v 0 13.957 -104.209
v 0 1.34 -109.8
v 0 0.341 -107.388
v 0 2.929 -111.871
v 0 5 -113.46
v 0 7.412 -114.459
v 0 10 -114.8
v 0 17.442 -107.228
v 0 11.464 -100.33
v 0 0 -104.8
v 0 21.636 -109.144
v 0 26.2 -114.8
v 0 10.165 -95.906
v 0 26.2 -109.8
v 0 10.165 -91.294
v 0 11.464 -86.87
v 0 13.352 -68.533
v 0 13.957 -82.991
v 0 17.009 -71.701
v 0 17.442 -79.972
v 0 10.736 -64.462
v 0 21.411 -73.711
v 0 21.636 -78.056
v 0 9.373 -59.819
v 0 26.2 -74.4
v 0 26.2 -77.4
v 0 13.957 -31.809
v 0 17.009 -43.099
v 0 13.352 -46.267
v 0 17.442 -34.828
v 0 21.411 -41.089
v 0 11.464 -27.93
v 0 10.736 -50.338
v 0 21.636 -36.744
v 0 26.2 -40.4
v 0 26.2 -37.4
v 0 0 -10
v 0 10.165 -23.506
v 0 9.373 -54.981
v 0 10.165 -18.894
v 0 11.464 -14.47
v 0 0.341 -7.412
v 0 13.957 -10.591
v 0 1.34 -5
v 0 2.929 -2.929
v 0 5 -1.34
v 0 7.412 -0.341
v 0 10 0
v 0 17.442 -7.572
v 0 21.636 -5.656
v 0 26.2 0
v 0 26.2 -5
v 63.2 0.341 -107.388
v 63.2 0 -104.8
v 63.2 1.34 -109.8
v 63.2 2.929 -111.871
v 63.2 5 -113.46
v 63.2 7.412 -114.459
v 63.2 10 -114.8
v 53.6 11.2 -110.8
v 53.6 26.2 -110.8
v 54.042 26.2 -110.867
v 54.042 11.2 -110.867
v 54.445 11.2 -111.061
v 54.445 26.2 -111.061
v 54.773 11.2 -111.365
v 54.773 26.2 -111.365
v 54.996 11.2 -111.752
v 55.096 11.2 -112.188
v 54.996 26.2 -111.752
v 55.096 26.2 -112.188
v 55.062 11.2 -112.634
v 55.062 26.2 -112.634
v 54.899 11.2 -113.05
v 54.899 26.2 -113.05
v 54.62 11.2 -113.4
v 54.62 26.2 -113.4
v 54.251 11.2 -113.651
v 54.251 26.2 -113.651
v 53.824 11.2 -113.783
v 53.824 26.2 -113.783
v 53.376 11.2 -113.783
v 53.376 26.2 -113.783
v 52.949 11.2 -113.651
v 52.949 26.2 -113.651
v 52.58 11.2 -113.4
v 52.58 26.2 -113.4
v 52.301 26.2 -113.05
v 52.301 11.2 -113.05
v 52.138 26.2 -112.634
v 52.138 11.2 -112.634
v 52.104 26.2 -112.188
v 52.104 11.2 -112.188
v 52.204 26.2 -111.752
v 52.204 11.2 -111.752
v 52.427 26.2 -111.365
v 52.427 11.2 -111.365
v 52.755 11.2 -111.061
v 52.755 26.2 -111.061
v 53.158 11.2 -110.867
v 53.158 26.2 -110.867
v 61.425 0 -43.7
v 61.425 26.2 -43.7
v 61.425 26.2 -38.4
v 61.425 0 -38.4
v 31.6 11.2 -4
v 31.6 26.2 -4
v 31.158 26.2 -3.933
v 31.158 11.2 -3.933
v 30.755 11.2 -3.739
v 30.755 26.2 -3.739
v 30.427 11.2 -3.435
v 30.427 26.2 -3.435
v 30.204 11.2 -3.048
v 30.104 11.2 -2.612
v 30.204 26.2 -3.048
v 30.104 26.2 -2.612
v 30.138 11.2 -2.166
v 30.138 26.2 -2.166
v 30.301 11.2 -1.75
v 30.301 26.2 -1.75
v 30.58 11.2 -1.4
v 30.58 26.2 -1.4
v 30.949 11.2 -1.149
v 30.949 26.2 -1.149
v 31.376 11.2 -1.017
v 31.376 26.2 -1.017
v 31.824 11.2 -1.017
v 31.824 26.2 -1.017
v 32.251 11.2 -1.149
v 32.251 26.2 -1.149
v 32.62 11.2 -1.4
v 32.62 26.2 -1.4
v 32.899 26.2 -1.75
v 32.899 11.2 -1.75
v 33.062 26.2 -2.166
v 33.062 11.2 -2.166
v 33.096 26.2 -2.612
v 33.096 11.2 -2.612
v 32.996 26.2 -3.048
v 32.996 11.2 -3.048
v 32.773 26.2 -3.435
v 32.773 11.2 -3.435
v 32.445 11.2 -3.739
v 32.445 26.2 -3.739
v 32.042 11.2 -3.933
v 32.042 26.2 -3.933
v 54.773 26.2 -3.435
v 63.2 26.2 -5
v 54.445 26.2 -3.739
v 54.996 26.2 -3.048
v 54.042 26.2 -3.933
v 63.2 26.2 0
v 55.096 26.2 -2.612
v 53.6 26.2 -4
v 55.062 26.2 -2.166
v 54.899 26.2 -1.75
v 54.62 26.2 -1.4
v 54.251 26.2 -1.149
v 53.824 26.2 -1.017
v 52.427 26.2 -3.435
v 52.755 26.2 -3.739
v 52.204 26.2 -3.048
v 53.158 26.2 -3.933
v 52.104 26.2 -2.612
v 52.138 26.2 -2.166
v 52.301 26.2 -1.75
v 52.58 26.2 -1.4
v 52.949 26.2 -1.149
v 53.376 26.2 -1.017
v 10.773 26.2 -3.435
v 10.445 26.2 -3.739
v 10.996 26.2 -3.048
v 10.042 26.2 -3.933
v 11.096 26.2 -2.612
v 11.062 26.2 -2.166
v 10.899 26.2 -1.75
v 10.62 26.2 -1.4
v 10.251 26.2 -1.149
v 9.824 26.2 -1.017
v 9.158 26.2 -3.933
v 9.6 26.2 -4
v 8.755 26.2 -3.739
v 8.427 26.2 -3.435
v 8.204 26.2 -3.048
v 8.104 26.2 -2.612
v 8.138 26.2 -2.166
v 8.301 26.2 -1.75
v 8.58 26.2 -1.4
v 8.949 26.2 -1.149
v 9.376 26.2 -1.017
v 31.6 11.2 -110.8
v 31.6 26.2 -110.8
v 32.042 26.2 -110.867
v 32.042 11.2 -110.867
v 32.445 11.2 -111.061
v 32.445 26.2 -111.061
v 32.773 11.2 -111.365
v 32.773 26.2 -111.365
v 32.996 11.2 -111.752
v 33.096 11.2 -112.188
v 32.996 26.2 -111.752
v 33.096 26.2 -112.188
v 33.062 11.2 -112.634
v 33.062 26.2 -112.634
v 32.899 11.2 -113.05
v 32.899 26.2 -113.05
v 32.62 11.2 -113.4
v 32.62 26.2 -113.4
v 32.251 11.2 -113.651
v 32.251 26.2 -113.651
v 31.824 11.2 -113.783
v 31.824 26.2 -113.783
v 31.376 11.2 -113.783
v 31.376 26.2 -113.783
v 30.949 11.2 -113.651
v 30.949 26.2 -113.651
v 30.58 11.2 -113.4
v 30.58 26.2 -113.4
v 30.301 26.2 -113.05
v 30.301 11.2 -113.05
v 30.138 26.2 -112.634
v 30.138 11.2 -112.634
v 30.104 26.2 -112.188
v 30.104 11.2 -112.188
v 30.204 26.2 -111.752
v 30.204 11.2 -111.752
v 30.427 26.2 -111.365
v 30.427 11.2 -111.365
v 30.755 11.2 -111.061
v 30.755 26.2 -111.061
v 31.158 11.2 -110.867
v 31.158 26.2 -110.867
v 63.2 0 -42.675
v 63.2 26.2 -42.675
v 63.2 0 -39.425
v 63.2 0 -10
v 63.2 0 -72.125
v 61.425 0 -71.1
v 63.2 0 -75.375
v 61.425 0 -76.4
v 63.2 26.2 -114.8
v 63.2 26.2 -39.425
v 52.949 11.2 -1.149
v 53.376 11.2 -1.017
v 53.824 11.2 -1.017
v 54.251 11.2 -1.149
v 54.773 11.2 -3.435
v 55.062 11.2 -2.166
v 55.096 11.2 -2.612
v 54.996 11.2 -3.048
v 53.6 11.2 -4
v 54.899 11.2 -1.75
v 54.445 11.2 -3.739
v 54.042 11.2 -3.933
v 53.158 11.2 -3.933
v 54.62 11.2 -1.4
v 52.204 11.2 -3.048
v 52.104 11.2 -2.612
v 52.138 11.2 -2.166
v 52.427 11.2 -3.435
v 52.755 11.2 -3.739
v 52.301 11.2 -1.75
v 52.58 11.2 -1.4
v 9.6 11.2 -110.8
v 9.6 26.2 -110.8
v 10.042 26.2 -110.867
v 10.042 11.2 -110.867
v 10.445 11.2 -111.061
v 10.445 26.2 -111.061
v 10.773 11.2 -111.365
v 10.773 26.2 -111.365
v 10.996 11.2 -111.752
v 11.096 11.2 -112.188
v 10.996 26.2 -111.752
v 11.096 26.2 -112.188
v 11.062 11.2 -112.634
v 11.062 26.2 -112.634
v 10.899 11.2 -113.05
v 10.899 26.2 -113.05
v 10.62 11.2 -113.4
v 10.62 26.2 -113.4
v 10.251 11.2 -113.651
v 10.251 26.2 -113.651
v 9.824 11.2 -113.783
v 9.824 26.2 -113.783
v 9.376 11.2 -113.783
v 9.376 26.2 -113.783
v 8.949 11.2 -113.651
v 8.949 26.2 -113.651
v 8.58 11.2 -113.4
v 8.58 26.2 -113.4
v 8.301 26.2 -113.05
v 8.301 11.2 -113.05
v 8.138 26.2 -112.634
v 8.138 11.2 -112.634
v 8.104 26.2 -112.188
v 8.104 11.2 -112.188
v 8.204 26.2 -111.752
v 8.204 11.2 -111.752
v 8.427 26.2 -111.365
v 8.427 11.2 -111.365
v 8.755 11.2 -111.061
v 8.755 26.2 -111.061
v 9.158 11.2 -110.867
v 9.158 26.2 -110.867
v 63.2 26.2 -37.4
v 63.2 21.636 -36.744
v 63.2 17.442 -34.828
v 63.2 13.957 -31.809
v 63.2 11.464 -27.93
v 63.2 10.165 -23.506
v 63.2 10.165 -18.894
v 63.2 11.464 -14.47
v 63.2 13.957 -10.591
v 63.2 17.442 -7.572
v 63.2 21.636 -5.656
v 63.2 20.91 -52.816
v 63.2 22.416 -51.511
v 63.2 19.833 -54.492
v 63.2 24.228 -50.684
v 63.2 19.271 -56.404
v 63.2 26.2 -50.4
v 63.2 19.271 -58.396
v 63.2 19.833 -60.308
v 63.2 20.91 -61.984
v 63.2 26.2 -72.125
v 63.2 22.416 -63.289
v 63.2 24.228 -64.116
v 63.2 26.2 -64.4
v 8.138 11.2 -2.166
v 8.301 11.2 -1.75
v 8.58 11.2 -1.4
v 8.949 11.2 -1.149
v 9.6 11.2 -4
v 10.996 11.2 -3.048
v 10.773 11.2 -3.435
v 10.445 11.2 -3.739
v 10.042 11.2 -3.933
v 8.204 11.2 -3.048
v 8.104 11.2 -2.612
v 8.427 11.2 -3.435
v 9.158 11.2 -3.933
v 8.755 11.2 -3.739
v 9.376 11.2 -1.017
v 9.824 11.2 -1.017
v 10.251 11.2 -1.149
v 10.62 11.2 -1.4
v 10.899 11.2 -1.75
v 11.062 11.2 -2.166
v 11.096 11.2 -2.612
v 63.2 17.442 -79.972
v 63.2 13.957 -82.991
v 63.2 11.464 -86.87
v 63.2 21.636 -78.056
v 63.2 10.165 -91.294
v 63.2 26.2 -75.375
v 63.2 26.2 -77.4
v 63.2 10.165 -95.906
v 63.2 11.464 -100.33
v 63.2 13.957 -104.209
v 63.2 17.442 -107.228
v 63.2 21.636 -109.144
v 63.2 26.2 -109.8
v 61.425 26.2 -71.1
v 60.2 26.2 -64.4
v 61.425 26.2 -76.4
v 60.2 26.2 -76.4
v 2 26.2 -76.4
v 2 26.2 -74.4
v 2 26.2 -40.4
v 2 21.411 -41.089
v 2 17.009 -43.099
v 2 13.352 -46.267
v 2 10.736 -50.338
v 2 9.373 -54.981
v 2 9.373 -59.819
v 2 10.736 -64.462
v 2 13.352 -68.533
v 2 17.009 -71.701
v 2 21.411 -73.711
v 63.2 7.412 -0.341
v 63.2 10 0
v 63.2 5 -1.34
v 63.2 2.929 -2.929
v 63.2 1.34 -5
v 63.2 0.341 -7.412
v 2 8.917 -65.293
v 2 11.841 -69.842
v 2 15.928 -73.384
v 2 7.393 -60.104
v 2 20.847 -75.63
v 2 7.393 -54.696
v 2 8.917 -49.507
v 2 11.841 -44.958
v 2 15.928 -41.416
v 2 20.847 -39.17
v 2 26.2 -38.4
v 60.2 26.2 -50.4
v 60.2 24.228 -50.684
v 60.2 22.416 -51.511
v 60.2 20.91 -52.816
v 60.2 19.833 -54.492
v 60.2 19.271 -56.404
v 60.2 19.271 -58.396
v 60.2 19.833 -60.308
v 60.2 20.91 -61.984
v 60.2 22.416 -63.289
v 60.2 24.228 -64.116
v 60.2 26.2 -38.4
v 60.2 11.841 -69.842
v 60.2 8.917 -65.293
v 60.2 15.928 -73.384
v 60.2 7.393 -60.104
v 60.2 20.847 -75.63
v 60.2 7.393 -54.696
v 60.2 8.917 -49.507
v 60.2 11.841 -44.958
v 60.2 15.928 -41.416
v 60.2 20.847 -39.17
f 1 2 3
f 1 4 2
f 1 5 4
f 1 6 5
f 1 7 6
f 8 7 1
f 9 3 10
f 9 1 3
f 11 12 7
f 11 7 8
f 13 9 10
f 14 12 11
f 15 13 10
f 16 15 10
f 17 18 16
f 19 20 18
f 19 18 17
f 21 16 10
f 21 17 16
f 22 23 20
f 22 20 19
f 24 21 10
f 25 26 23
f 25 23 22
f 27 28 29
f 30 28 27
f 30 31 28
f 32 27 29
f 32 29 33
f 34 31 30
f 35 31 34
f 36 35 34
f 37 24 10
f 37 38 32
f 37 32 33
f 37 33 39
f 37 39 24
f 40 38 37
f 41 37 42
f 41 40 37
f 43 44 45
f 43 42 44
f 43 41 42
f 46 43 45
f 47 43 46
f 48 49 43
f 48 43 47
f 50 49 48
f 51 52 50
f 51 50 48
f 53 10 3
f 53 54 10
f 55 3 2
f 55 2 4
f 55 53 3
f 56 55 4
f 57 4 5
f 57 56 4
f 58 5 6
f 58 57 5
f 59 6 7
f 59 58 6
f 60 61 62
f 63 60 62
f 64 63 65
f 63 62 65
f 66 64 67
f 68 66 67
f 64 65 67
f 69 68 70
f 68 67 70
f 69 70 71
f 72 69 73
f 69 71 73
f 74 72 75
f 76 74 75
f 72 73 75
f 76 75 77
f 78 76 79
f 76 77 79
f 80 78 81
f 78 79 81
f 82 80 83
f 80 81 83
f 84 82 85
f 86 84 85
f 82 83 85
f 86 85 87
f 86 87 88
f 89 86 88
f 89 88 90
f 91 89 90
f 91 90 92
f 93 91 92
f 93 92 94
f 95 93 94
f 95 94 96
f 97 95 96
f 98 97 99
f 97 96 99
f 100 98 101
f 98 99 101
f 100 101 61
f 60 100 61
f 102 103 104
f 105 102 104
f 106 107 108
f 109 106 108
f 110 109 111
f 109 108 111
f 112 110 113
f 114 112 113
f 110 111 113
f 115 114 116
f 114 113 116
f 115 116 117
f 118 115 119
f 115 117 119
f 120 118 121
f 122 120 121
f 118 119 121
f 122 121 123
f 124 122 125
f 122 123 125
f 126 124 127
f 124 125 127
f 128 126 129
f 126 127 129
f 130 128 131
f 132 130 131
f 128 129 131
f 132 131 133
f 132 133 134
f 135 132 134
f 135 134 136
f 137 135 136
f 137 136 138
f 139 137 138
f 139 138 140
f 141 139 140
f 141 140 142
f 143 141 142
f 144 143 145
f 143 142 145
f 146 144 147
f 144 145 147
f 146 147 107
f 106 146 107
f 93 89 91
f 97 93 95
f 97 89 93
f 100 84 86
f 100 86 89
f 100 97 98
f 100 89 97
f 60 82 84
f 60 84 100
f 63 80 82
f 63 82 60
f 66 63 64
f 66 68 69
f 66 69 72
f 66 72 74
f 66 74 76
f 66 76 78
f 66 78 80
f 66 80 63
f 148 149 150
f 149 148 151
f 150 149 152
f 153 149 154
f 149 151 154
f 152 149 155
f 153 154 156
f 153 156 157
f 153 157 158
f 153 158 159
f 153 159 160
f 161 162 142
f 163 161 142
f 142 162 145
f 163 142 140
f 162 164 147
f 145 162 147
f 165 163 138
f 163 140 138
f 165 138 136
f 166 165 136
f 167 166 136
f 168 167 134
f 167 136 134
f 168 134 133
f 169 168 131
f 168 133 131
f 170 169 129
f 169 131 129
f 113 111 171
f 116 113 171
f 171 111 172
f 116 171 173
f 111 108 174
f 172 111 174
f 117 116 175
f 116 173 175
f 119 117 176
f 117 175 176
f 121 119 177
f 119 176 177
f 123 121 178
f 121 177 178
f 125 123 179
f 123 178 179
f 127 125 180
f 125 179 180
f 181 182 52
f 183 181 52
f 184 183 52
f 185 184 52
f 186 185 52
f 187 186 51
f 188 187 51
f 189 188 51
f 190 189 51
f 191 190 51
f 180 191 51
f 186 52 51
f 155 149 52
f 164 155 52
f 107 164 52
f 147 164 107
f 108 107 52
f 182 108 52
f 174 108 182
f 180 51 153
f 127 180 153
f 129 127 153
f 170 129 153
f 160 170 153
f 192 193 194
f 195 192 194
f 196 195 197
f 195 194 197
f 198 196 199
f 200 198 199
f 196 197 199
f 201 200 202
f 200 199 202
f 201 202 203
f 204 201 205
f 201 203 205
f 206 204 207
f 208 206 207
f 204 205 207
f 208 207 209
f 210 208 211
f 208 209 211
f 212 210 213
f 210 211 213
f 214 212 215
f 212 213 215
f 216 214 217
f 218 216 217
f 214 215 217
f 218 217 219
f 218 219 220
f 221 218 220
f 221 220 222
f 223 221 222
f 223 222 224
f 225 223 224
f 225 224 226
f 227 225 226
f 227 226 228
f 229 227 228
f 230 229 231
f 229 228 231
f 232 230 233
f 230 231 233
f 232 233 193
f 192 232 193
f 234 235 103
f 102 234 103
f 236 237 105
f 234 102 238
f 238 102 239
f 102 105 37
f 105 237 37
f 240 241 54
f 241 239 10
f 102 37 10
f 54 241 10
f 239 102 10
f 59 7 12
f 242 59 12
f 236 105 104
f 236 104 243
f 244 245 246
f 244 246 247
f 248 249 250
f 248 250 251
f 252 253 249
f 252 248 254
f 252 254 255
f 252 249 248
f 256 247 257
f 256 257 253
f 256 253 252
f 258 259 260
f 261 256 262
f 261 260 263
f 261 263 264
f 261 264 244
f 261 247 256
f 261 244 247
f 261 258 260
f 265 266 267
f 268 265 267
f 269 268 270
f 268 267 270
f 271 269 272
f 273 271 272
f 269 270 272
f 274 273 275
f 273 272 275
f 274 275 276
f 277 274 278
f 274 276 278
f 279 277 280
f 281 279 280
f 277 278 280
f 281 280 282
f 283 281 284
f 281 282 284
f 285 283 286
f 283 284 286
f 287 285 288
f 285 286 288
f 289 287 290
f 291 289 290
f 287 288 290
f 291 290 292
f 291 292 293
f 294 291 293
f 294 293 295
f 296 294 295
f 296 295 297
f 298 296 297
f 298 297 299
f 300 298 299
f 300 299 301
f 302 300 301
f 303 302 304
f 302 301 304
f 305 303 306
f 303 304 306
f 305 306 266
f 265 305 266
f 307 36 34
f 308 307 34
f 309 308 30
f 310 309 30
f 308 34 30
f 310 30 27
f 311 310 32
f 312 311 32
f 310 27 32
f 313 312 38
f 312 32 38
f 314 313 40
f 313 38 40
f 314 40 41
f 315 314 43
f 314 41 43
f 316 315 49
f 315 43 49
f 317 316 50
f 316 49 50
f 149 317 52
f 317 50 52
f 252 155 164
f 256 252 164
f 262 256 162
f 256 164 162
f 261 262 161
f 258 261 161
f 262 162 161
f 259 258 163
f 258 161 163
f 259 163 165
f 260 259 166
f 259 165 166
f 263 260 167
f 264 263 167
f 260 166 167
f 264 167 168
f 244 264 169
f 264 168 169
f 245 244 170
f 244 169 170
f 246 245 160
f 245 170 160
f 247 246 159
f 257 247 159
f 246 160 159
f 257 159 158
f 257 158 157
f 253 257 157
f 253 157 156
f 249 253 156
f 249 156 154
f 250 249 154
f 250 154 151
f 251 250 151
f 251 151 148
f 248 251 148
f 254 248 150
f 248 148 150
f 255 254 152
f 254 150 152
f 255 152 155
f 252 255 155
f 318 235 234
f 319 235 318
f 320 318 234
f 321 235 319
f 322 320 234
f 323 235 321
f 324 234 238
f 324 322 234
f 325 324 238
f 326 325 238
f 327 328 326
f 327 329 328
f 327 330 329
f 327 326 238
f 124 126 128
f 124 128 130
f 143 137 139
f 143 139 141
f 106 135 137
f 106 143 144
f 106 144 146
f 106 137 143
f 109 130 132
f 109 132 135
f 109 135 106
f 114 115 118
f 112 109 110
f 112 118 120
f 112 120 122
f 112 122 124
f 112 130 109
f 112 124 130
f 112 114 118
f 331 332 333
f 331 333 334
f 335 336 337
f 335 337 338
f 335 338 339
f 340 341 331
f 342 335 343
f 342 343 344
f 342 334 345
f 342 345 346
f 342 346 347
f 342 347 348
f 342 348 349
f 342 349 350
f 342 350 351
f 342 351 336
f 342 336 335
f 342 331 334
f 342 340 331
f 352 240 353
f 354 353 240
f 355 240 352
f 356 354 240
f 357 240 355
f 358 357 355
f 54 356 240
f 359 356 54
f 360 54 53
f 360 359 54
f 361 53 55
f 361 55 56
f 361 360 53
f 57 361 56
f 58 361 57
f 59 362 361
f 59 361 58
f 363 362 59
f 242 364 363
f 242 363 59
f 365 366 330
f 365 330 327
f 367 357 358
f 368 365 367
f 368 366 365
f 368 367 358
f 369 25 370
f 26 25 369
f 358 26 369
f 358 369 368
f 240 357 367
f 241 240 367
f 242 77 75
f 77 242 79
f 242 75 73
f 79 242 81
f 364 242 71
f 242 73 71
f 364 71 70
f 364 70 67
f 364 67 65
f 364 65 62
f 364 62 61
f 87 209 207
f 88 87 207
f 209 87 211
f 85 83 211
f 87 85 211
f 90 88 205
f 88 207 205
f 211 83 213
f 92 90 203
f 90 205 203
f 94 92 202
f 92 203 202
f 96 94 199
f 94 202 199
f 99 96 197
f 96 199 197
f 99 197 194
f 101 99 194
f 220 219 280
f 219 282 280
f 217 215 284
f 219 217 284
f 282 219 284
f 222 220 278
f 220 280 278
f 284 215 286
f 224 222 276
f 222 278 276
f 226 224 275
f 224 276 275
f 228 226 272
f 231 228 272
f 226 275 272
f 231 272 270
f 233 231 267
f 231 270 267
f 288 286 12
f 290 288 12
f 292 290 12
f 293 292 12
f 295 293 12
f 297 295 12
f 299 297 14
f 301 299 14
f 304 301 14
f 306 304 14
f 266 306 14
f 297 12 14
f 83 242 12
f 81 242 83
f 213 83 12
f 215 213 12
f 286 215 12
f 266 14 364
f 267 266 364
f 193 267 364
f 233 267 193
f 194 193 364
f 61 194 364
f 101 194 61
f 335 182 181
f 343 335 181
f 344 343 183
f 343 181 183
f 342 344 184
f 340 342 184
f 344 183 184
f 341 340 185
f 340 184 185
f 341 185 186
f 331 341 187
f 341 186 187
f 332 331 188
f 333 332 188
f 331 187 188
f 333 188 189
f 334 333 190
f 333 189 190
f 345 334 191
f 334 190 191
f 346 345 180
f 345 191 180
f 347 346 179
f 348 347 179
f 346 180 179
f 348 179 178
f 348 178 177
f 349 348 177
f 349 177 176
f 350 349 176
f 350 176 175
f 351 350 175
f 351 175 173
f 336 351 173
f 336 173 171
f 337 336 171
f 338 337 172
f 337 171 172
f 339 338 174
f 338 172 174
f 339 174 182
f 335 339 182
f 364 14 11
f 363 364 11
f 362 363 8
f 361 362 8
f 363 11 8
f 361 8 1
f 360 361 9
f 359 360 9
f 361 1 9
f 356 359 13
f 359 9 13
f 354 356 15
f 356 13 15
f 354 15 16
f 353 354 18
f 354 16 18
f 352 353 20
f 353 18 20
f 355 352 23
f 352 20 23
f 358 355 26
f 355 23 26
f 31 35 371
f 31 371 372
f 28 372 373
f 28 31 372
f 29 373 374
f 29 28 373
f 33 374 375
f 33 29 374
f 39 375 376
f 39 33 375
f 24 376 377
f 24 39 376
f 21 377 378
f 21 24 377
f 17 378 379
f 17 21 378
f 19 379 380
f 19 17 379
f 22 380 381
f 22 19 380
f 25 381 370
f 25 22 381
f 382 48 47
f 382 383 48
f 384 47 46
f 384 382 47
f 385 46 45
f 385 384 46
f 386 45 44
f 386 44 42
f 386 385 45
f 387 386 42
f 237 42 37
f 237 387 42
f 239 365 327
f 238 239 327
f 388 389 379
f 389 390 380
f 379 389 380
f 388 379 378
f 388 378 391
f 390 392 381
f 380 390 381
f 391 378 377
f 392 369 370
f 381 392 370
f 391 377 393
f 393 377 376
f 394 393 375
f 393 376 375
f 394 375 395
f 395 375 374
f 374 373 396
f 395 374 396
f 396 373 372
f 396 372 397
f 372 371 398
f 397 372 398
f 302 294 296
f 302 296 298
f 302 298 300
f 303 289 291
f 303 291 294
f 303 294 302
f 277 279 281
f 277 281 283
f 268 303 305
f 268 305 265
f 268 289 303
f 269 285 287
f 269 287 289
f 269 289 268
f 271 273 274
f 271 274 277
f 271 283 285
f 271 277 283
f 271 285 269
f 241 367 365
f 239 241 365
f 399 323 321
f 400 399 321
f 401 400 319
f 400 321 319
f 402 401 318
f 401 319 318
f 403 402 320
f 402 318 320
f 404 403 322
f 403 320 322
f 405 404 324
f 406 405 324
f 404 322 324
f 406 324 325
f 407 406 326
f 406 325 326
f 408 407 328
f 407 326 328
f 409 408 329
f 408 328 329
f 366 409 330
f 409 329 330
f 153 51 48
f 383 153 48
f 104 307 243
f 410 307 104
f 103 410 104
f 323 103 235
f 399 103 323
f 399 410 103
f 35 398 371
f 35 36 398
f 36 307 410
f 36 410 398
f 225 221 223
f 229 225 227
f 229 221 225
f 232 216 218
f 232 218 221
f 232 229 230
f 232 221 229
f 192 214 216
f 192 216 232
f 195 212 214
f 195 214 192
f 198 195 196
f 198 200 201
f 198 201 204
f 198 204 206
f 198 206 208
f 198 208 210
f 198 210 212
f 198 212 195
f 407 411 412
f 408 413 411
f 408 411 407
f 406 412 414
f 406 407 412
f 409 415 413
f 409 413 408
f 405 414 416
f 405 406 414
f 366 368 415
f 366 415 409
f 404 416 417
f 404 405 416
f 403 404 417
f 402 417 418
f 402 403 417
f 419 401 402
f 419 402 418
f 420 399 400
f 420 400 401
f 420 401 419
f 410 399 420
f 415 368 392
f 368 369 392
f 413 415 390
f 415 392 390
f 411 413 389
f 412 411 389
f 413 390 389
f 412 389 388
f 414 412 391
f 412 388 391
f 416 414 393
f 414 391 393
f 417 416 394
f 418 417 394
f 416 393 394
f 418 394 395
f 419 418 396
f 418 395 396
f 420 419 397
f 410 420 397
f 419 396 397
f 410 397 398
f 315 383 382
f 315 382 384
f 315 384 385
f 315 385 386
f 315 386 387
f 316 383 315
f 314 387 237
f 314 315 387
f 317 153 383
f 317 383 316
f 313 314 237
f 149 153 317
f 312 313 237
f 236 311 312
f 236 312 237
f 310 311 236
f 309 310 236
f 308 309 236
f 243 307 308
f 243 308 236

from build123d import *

# Parameters (mm, degrees)
BOSS_EXTRUDE1_DEPTH = 63.2
CUT_EXTRUDE14_REACH = 135.64
SKETCH31_R          = 19
CUT_EXTRUDE15_DEPTH = 60.2
CUT_EXTRUDE16_REACH = 135.64
SKETCH32_R          = 7
BOSS_EXTRUDE6_DEPTH = 2
FILLET1_R           = 10
SKETCH34_R          = 1.5
CUT_EXTRUDE17_DEPTH = 15


with BuildPart() as part:
    # Sketch1 → Boss-Extrude1 (new body)
    with BuildSketch(Plane(origin=(0, 0, 0), x_dir=(0, 0, -1), z_dir=(1, 0, 0))):
        with BuildLine():
            Line((0, 0), (114.8, 0))
            Line((114.8, 0), (114.8, 26.2))
            Line((114.8, 26.2), (109.8, 26.2))
            ThreePointArc((109.8, 26.2), (93.6, 10), (77.4, 26.2))
            Line((77.4, 26.2), (37.4, 26.2))
            ThreePointArc((37.4, 26.2), (21.2, 10), (5, 26.2))
            Line((5, 26.2), (0, 26.2))
            Line((0, 26.2), (0, 0))
        make_face()
    extrude(amount=BOSS_EXTRUDE1_DEPTH)

    # Sketch30 → Cut-Extrude14 (cut, up to next)
    with BuildSketch(Plane(origin=(0, 26.2, 0), x_dir=(1, 0, 0), z_dir=(0, 1, 0)), mode=Mode.PRIVATE) as cut_extrude14_sk1:
        Polygon((63.2, 75.375), (61.424647922, 76.4), (61.424647922, 71.1), (63.2, 72.125), align=None)
    cut_extrude14_tool1 = extrude(cut_extrude14_sk1.sketch, amount=-CUT_EXTRUDE14_REACH, mode=Mode.PRIVATE) & part.part
    # Sketch30 → Cut-Extrude14 (cut, up to next)
    with BuildSketch(Plane(origin=(0, 26.2, 0), x_dir=(1, 0, 0), z_dir=(0, 1, 0)), mode=Mode.PRIVATE) as cut_extrude14_sk2:
        Polygon((63.2, 42.675), (61.424647922, 43.7), (61.424647922, 38.4), (63.2, 39.425), align=None)
    cut_extrude14_tool2 = extrude(cut_extrude14_sk2.sketch, amount=-CUT_EXTRUDE14_REACH, mode=Mode.PRIVATE) & part.part
    add(cut_extrude14_tool1.solids().sort_by_distance((62.241379, 26.2, -73.75))[0], mode=Mode.SUBTRACT)
    add(cut_extrude14_tool2.solids().sort_by_distance((62.241379, 26.2, -41.05))[0], mode=Mode.SUBTRACT)

    # Sketch31 → Cut-Extrude15 (cut)
    with BuildSketch(Plane.ZY):
        with Locations((-57.4, 26.2)):
            Circle(SKETCH31_R)
    extrude(amount=-CUT_EXTRUDE15_DEPTH, mode=Mode.SUBTRACT)

    # Sketch32 → Cut-Extrude16 (cut, up to next)
    with BuildSketch(Plane(origin=(63.2, 0, 0), x_dir=(0, 0, -1), z_dir=(1, 0, 0)), mode=Mode.PRIVATE) as cut_extrude16_sk1:
        with Locations((57.4, 26.2)):
            Circle(SKETCH32_R)
    cut_extrude16_tool1 = extrude(cut_extrude16_sk1.sketch, amount=-CUT_EXTRUDE16_REACH, mode=Mode.PRIVATE) & part.part
    add(cut_extrude16_tool1.solids().sort_by_distance((63.2, 26.2, -57.4))[0], mode=Mode.SUBTRACT)

    # Sketch33 → Boss-Extrude6 (add)
    with BuildSketch(Plane.ZY):
        with BuildLine():
            Line((-74.4, 26.2), (-76.4, 26.2))
            ThreePointArc((-76.4, 26.2), (-57.4, 7.2), (-38.4, 26.2))
            Line((-38.4, 26.2), (-40.4, 26.2))
            ThreePointArc((-40.4, 26.2), (-57.4, 9.2), (-74.4, 26.2))
        make_face()
    extrude(amount=-BOSS_EXTRUDE6_DEPTH)

    # Fillet1
    fillet1_edges = [part.edges().sort_by_distance(p)[0] for p in [
        (31.6, 0, -114.8),
        (31.6, 0, 0),
    ]]
    fillet(fillet1_edges, radius=FILLET1_R)

    # Sketch34 → Cut-Extrude17 (cut)
    with BuildSketch(Plane(origin=(0, 26.2, 0), x_dir=(1, 0, 0), z_dir=(0, 1, 0))):
        with Locations(Location((9.6, 112.3, 0), (0, 0, 270))):
            Circle(SKETCH34_R)
        with Locations(Location((31.6, 112.3, 0), (0, 0, 270))):
            Circle(SKETCH34_R)
        with Locations(Location((53.6, 112.3, 0), (0, 0, 270))):
            Circle(SKETCH34_R)
        with Locations(Location((53.6, 2.5, 0), (0, 0, 90))):
            Circle(SKETCH34_R)
        with Locations(Location((31.6, 2.5, 0), (0, 0, 90))):
            Circle(SKETCH34_R)
        with Locations(Location((9.6, 2.5, 0), (0, 0, 90))):
            Circle(SKETCH34_R)
    extrude(amount=-CUT_EXTRUDE17_DEPTH, mode=Mode.SUBTRACT)


solid = part.part
